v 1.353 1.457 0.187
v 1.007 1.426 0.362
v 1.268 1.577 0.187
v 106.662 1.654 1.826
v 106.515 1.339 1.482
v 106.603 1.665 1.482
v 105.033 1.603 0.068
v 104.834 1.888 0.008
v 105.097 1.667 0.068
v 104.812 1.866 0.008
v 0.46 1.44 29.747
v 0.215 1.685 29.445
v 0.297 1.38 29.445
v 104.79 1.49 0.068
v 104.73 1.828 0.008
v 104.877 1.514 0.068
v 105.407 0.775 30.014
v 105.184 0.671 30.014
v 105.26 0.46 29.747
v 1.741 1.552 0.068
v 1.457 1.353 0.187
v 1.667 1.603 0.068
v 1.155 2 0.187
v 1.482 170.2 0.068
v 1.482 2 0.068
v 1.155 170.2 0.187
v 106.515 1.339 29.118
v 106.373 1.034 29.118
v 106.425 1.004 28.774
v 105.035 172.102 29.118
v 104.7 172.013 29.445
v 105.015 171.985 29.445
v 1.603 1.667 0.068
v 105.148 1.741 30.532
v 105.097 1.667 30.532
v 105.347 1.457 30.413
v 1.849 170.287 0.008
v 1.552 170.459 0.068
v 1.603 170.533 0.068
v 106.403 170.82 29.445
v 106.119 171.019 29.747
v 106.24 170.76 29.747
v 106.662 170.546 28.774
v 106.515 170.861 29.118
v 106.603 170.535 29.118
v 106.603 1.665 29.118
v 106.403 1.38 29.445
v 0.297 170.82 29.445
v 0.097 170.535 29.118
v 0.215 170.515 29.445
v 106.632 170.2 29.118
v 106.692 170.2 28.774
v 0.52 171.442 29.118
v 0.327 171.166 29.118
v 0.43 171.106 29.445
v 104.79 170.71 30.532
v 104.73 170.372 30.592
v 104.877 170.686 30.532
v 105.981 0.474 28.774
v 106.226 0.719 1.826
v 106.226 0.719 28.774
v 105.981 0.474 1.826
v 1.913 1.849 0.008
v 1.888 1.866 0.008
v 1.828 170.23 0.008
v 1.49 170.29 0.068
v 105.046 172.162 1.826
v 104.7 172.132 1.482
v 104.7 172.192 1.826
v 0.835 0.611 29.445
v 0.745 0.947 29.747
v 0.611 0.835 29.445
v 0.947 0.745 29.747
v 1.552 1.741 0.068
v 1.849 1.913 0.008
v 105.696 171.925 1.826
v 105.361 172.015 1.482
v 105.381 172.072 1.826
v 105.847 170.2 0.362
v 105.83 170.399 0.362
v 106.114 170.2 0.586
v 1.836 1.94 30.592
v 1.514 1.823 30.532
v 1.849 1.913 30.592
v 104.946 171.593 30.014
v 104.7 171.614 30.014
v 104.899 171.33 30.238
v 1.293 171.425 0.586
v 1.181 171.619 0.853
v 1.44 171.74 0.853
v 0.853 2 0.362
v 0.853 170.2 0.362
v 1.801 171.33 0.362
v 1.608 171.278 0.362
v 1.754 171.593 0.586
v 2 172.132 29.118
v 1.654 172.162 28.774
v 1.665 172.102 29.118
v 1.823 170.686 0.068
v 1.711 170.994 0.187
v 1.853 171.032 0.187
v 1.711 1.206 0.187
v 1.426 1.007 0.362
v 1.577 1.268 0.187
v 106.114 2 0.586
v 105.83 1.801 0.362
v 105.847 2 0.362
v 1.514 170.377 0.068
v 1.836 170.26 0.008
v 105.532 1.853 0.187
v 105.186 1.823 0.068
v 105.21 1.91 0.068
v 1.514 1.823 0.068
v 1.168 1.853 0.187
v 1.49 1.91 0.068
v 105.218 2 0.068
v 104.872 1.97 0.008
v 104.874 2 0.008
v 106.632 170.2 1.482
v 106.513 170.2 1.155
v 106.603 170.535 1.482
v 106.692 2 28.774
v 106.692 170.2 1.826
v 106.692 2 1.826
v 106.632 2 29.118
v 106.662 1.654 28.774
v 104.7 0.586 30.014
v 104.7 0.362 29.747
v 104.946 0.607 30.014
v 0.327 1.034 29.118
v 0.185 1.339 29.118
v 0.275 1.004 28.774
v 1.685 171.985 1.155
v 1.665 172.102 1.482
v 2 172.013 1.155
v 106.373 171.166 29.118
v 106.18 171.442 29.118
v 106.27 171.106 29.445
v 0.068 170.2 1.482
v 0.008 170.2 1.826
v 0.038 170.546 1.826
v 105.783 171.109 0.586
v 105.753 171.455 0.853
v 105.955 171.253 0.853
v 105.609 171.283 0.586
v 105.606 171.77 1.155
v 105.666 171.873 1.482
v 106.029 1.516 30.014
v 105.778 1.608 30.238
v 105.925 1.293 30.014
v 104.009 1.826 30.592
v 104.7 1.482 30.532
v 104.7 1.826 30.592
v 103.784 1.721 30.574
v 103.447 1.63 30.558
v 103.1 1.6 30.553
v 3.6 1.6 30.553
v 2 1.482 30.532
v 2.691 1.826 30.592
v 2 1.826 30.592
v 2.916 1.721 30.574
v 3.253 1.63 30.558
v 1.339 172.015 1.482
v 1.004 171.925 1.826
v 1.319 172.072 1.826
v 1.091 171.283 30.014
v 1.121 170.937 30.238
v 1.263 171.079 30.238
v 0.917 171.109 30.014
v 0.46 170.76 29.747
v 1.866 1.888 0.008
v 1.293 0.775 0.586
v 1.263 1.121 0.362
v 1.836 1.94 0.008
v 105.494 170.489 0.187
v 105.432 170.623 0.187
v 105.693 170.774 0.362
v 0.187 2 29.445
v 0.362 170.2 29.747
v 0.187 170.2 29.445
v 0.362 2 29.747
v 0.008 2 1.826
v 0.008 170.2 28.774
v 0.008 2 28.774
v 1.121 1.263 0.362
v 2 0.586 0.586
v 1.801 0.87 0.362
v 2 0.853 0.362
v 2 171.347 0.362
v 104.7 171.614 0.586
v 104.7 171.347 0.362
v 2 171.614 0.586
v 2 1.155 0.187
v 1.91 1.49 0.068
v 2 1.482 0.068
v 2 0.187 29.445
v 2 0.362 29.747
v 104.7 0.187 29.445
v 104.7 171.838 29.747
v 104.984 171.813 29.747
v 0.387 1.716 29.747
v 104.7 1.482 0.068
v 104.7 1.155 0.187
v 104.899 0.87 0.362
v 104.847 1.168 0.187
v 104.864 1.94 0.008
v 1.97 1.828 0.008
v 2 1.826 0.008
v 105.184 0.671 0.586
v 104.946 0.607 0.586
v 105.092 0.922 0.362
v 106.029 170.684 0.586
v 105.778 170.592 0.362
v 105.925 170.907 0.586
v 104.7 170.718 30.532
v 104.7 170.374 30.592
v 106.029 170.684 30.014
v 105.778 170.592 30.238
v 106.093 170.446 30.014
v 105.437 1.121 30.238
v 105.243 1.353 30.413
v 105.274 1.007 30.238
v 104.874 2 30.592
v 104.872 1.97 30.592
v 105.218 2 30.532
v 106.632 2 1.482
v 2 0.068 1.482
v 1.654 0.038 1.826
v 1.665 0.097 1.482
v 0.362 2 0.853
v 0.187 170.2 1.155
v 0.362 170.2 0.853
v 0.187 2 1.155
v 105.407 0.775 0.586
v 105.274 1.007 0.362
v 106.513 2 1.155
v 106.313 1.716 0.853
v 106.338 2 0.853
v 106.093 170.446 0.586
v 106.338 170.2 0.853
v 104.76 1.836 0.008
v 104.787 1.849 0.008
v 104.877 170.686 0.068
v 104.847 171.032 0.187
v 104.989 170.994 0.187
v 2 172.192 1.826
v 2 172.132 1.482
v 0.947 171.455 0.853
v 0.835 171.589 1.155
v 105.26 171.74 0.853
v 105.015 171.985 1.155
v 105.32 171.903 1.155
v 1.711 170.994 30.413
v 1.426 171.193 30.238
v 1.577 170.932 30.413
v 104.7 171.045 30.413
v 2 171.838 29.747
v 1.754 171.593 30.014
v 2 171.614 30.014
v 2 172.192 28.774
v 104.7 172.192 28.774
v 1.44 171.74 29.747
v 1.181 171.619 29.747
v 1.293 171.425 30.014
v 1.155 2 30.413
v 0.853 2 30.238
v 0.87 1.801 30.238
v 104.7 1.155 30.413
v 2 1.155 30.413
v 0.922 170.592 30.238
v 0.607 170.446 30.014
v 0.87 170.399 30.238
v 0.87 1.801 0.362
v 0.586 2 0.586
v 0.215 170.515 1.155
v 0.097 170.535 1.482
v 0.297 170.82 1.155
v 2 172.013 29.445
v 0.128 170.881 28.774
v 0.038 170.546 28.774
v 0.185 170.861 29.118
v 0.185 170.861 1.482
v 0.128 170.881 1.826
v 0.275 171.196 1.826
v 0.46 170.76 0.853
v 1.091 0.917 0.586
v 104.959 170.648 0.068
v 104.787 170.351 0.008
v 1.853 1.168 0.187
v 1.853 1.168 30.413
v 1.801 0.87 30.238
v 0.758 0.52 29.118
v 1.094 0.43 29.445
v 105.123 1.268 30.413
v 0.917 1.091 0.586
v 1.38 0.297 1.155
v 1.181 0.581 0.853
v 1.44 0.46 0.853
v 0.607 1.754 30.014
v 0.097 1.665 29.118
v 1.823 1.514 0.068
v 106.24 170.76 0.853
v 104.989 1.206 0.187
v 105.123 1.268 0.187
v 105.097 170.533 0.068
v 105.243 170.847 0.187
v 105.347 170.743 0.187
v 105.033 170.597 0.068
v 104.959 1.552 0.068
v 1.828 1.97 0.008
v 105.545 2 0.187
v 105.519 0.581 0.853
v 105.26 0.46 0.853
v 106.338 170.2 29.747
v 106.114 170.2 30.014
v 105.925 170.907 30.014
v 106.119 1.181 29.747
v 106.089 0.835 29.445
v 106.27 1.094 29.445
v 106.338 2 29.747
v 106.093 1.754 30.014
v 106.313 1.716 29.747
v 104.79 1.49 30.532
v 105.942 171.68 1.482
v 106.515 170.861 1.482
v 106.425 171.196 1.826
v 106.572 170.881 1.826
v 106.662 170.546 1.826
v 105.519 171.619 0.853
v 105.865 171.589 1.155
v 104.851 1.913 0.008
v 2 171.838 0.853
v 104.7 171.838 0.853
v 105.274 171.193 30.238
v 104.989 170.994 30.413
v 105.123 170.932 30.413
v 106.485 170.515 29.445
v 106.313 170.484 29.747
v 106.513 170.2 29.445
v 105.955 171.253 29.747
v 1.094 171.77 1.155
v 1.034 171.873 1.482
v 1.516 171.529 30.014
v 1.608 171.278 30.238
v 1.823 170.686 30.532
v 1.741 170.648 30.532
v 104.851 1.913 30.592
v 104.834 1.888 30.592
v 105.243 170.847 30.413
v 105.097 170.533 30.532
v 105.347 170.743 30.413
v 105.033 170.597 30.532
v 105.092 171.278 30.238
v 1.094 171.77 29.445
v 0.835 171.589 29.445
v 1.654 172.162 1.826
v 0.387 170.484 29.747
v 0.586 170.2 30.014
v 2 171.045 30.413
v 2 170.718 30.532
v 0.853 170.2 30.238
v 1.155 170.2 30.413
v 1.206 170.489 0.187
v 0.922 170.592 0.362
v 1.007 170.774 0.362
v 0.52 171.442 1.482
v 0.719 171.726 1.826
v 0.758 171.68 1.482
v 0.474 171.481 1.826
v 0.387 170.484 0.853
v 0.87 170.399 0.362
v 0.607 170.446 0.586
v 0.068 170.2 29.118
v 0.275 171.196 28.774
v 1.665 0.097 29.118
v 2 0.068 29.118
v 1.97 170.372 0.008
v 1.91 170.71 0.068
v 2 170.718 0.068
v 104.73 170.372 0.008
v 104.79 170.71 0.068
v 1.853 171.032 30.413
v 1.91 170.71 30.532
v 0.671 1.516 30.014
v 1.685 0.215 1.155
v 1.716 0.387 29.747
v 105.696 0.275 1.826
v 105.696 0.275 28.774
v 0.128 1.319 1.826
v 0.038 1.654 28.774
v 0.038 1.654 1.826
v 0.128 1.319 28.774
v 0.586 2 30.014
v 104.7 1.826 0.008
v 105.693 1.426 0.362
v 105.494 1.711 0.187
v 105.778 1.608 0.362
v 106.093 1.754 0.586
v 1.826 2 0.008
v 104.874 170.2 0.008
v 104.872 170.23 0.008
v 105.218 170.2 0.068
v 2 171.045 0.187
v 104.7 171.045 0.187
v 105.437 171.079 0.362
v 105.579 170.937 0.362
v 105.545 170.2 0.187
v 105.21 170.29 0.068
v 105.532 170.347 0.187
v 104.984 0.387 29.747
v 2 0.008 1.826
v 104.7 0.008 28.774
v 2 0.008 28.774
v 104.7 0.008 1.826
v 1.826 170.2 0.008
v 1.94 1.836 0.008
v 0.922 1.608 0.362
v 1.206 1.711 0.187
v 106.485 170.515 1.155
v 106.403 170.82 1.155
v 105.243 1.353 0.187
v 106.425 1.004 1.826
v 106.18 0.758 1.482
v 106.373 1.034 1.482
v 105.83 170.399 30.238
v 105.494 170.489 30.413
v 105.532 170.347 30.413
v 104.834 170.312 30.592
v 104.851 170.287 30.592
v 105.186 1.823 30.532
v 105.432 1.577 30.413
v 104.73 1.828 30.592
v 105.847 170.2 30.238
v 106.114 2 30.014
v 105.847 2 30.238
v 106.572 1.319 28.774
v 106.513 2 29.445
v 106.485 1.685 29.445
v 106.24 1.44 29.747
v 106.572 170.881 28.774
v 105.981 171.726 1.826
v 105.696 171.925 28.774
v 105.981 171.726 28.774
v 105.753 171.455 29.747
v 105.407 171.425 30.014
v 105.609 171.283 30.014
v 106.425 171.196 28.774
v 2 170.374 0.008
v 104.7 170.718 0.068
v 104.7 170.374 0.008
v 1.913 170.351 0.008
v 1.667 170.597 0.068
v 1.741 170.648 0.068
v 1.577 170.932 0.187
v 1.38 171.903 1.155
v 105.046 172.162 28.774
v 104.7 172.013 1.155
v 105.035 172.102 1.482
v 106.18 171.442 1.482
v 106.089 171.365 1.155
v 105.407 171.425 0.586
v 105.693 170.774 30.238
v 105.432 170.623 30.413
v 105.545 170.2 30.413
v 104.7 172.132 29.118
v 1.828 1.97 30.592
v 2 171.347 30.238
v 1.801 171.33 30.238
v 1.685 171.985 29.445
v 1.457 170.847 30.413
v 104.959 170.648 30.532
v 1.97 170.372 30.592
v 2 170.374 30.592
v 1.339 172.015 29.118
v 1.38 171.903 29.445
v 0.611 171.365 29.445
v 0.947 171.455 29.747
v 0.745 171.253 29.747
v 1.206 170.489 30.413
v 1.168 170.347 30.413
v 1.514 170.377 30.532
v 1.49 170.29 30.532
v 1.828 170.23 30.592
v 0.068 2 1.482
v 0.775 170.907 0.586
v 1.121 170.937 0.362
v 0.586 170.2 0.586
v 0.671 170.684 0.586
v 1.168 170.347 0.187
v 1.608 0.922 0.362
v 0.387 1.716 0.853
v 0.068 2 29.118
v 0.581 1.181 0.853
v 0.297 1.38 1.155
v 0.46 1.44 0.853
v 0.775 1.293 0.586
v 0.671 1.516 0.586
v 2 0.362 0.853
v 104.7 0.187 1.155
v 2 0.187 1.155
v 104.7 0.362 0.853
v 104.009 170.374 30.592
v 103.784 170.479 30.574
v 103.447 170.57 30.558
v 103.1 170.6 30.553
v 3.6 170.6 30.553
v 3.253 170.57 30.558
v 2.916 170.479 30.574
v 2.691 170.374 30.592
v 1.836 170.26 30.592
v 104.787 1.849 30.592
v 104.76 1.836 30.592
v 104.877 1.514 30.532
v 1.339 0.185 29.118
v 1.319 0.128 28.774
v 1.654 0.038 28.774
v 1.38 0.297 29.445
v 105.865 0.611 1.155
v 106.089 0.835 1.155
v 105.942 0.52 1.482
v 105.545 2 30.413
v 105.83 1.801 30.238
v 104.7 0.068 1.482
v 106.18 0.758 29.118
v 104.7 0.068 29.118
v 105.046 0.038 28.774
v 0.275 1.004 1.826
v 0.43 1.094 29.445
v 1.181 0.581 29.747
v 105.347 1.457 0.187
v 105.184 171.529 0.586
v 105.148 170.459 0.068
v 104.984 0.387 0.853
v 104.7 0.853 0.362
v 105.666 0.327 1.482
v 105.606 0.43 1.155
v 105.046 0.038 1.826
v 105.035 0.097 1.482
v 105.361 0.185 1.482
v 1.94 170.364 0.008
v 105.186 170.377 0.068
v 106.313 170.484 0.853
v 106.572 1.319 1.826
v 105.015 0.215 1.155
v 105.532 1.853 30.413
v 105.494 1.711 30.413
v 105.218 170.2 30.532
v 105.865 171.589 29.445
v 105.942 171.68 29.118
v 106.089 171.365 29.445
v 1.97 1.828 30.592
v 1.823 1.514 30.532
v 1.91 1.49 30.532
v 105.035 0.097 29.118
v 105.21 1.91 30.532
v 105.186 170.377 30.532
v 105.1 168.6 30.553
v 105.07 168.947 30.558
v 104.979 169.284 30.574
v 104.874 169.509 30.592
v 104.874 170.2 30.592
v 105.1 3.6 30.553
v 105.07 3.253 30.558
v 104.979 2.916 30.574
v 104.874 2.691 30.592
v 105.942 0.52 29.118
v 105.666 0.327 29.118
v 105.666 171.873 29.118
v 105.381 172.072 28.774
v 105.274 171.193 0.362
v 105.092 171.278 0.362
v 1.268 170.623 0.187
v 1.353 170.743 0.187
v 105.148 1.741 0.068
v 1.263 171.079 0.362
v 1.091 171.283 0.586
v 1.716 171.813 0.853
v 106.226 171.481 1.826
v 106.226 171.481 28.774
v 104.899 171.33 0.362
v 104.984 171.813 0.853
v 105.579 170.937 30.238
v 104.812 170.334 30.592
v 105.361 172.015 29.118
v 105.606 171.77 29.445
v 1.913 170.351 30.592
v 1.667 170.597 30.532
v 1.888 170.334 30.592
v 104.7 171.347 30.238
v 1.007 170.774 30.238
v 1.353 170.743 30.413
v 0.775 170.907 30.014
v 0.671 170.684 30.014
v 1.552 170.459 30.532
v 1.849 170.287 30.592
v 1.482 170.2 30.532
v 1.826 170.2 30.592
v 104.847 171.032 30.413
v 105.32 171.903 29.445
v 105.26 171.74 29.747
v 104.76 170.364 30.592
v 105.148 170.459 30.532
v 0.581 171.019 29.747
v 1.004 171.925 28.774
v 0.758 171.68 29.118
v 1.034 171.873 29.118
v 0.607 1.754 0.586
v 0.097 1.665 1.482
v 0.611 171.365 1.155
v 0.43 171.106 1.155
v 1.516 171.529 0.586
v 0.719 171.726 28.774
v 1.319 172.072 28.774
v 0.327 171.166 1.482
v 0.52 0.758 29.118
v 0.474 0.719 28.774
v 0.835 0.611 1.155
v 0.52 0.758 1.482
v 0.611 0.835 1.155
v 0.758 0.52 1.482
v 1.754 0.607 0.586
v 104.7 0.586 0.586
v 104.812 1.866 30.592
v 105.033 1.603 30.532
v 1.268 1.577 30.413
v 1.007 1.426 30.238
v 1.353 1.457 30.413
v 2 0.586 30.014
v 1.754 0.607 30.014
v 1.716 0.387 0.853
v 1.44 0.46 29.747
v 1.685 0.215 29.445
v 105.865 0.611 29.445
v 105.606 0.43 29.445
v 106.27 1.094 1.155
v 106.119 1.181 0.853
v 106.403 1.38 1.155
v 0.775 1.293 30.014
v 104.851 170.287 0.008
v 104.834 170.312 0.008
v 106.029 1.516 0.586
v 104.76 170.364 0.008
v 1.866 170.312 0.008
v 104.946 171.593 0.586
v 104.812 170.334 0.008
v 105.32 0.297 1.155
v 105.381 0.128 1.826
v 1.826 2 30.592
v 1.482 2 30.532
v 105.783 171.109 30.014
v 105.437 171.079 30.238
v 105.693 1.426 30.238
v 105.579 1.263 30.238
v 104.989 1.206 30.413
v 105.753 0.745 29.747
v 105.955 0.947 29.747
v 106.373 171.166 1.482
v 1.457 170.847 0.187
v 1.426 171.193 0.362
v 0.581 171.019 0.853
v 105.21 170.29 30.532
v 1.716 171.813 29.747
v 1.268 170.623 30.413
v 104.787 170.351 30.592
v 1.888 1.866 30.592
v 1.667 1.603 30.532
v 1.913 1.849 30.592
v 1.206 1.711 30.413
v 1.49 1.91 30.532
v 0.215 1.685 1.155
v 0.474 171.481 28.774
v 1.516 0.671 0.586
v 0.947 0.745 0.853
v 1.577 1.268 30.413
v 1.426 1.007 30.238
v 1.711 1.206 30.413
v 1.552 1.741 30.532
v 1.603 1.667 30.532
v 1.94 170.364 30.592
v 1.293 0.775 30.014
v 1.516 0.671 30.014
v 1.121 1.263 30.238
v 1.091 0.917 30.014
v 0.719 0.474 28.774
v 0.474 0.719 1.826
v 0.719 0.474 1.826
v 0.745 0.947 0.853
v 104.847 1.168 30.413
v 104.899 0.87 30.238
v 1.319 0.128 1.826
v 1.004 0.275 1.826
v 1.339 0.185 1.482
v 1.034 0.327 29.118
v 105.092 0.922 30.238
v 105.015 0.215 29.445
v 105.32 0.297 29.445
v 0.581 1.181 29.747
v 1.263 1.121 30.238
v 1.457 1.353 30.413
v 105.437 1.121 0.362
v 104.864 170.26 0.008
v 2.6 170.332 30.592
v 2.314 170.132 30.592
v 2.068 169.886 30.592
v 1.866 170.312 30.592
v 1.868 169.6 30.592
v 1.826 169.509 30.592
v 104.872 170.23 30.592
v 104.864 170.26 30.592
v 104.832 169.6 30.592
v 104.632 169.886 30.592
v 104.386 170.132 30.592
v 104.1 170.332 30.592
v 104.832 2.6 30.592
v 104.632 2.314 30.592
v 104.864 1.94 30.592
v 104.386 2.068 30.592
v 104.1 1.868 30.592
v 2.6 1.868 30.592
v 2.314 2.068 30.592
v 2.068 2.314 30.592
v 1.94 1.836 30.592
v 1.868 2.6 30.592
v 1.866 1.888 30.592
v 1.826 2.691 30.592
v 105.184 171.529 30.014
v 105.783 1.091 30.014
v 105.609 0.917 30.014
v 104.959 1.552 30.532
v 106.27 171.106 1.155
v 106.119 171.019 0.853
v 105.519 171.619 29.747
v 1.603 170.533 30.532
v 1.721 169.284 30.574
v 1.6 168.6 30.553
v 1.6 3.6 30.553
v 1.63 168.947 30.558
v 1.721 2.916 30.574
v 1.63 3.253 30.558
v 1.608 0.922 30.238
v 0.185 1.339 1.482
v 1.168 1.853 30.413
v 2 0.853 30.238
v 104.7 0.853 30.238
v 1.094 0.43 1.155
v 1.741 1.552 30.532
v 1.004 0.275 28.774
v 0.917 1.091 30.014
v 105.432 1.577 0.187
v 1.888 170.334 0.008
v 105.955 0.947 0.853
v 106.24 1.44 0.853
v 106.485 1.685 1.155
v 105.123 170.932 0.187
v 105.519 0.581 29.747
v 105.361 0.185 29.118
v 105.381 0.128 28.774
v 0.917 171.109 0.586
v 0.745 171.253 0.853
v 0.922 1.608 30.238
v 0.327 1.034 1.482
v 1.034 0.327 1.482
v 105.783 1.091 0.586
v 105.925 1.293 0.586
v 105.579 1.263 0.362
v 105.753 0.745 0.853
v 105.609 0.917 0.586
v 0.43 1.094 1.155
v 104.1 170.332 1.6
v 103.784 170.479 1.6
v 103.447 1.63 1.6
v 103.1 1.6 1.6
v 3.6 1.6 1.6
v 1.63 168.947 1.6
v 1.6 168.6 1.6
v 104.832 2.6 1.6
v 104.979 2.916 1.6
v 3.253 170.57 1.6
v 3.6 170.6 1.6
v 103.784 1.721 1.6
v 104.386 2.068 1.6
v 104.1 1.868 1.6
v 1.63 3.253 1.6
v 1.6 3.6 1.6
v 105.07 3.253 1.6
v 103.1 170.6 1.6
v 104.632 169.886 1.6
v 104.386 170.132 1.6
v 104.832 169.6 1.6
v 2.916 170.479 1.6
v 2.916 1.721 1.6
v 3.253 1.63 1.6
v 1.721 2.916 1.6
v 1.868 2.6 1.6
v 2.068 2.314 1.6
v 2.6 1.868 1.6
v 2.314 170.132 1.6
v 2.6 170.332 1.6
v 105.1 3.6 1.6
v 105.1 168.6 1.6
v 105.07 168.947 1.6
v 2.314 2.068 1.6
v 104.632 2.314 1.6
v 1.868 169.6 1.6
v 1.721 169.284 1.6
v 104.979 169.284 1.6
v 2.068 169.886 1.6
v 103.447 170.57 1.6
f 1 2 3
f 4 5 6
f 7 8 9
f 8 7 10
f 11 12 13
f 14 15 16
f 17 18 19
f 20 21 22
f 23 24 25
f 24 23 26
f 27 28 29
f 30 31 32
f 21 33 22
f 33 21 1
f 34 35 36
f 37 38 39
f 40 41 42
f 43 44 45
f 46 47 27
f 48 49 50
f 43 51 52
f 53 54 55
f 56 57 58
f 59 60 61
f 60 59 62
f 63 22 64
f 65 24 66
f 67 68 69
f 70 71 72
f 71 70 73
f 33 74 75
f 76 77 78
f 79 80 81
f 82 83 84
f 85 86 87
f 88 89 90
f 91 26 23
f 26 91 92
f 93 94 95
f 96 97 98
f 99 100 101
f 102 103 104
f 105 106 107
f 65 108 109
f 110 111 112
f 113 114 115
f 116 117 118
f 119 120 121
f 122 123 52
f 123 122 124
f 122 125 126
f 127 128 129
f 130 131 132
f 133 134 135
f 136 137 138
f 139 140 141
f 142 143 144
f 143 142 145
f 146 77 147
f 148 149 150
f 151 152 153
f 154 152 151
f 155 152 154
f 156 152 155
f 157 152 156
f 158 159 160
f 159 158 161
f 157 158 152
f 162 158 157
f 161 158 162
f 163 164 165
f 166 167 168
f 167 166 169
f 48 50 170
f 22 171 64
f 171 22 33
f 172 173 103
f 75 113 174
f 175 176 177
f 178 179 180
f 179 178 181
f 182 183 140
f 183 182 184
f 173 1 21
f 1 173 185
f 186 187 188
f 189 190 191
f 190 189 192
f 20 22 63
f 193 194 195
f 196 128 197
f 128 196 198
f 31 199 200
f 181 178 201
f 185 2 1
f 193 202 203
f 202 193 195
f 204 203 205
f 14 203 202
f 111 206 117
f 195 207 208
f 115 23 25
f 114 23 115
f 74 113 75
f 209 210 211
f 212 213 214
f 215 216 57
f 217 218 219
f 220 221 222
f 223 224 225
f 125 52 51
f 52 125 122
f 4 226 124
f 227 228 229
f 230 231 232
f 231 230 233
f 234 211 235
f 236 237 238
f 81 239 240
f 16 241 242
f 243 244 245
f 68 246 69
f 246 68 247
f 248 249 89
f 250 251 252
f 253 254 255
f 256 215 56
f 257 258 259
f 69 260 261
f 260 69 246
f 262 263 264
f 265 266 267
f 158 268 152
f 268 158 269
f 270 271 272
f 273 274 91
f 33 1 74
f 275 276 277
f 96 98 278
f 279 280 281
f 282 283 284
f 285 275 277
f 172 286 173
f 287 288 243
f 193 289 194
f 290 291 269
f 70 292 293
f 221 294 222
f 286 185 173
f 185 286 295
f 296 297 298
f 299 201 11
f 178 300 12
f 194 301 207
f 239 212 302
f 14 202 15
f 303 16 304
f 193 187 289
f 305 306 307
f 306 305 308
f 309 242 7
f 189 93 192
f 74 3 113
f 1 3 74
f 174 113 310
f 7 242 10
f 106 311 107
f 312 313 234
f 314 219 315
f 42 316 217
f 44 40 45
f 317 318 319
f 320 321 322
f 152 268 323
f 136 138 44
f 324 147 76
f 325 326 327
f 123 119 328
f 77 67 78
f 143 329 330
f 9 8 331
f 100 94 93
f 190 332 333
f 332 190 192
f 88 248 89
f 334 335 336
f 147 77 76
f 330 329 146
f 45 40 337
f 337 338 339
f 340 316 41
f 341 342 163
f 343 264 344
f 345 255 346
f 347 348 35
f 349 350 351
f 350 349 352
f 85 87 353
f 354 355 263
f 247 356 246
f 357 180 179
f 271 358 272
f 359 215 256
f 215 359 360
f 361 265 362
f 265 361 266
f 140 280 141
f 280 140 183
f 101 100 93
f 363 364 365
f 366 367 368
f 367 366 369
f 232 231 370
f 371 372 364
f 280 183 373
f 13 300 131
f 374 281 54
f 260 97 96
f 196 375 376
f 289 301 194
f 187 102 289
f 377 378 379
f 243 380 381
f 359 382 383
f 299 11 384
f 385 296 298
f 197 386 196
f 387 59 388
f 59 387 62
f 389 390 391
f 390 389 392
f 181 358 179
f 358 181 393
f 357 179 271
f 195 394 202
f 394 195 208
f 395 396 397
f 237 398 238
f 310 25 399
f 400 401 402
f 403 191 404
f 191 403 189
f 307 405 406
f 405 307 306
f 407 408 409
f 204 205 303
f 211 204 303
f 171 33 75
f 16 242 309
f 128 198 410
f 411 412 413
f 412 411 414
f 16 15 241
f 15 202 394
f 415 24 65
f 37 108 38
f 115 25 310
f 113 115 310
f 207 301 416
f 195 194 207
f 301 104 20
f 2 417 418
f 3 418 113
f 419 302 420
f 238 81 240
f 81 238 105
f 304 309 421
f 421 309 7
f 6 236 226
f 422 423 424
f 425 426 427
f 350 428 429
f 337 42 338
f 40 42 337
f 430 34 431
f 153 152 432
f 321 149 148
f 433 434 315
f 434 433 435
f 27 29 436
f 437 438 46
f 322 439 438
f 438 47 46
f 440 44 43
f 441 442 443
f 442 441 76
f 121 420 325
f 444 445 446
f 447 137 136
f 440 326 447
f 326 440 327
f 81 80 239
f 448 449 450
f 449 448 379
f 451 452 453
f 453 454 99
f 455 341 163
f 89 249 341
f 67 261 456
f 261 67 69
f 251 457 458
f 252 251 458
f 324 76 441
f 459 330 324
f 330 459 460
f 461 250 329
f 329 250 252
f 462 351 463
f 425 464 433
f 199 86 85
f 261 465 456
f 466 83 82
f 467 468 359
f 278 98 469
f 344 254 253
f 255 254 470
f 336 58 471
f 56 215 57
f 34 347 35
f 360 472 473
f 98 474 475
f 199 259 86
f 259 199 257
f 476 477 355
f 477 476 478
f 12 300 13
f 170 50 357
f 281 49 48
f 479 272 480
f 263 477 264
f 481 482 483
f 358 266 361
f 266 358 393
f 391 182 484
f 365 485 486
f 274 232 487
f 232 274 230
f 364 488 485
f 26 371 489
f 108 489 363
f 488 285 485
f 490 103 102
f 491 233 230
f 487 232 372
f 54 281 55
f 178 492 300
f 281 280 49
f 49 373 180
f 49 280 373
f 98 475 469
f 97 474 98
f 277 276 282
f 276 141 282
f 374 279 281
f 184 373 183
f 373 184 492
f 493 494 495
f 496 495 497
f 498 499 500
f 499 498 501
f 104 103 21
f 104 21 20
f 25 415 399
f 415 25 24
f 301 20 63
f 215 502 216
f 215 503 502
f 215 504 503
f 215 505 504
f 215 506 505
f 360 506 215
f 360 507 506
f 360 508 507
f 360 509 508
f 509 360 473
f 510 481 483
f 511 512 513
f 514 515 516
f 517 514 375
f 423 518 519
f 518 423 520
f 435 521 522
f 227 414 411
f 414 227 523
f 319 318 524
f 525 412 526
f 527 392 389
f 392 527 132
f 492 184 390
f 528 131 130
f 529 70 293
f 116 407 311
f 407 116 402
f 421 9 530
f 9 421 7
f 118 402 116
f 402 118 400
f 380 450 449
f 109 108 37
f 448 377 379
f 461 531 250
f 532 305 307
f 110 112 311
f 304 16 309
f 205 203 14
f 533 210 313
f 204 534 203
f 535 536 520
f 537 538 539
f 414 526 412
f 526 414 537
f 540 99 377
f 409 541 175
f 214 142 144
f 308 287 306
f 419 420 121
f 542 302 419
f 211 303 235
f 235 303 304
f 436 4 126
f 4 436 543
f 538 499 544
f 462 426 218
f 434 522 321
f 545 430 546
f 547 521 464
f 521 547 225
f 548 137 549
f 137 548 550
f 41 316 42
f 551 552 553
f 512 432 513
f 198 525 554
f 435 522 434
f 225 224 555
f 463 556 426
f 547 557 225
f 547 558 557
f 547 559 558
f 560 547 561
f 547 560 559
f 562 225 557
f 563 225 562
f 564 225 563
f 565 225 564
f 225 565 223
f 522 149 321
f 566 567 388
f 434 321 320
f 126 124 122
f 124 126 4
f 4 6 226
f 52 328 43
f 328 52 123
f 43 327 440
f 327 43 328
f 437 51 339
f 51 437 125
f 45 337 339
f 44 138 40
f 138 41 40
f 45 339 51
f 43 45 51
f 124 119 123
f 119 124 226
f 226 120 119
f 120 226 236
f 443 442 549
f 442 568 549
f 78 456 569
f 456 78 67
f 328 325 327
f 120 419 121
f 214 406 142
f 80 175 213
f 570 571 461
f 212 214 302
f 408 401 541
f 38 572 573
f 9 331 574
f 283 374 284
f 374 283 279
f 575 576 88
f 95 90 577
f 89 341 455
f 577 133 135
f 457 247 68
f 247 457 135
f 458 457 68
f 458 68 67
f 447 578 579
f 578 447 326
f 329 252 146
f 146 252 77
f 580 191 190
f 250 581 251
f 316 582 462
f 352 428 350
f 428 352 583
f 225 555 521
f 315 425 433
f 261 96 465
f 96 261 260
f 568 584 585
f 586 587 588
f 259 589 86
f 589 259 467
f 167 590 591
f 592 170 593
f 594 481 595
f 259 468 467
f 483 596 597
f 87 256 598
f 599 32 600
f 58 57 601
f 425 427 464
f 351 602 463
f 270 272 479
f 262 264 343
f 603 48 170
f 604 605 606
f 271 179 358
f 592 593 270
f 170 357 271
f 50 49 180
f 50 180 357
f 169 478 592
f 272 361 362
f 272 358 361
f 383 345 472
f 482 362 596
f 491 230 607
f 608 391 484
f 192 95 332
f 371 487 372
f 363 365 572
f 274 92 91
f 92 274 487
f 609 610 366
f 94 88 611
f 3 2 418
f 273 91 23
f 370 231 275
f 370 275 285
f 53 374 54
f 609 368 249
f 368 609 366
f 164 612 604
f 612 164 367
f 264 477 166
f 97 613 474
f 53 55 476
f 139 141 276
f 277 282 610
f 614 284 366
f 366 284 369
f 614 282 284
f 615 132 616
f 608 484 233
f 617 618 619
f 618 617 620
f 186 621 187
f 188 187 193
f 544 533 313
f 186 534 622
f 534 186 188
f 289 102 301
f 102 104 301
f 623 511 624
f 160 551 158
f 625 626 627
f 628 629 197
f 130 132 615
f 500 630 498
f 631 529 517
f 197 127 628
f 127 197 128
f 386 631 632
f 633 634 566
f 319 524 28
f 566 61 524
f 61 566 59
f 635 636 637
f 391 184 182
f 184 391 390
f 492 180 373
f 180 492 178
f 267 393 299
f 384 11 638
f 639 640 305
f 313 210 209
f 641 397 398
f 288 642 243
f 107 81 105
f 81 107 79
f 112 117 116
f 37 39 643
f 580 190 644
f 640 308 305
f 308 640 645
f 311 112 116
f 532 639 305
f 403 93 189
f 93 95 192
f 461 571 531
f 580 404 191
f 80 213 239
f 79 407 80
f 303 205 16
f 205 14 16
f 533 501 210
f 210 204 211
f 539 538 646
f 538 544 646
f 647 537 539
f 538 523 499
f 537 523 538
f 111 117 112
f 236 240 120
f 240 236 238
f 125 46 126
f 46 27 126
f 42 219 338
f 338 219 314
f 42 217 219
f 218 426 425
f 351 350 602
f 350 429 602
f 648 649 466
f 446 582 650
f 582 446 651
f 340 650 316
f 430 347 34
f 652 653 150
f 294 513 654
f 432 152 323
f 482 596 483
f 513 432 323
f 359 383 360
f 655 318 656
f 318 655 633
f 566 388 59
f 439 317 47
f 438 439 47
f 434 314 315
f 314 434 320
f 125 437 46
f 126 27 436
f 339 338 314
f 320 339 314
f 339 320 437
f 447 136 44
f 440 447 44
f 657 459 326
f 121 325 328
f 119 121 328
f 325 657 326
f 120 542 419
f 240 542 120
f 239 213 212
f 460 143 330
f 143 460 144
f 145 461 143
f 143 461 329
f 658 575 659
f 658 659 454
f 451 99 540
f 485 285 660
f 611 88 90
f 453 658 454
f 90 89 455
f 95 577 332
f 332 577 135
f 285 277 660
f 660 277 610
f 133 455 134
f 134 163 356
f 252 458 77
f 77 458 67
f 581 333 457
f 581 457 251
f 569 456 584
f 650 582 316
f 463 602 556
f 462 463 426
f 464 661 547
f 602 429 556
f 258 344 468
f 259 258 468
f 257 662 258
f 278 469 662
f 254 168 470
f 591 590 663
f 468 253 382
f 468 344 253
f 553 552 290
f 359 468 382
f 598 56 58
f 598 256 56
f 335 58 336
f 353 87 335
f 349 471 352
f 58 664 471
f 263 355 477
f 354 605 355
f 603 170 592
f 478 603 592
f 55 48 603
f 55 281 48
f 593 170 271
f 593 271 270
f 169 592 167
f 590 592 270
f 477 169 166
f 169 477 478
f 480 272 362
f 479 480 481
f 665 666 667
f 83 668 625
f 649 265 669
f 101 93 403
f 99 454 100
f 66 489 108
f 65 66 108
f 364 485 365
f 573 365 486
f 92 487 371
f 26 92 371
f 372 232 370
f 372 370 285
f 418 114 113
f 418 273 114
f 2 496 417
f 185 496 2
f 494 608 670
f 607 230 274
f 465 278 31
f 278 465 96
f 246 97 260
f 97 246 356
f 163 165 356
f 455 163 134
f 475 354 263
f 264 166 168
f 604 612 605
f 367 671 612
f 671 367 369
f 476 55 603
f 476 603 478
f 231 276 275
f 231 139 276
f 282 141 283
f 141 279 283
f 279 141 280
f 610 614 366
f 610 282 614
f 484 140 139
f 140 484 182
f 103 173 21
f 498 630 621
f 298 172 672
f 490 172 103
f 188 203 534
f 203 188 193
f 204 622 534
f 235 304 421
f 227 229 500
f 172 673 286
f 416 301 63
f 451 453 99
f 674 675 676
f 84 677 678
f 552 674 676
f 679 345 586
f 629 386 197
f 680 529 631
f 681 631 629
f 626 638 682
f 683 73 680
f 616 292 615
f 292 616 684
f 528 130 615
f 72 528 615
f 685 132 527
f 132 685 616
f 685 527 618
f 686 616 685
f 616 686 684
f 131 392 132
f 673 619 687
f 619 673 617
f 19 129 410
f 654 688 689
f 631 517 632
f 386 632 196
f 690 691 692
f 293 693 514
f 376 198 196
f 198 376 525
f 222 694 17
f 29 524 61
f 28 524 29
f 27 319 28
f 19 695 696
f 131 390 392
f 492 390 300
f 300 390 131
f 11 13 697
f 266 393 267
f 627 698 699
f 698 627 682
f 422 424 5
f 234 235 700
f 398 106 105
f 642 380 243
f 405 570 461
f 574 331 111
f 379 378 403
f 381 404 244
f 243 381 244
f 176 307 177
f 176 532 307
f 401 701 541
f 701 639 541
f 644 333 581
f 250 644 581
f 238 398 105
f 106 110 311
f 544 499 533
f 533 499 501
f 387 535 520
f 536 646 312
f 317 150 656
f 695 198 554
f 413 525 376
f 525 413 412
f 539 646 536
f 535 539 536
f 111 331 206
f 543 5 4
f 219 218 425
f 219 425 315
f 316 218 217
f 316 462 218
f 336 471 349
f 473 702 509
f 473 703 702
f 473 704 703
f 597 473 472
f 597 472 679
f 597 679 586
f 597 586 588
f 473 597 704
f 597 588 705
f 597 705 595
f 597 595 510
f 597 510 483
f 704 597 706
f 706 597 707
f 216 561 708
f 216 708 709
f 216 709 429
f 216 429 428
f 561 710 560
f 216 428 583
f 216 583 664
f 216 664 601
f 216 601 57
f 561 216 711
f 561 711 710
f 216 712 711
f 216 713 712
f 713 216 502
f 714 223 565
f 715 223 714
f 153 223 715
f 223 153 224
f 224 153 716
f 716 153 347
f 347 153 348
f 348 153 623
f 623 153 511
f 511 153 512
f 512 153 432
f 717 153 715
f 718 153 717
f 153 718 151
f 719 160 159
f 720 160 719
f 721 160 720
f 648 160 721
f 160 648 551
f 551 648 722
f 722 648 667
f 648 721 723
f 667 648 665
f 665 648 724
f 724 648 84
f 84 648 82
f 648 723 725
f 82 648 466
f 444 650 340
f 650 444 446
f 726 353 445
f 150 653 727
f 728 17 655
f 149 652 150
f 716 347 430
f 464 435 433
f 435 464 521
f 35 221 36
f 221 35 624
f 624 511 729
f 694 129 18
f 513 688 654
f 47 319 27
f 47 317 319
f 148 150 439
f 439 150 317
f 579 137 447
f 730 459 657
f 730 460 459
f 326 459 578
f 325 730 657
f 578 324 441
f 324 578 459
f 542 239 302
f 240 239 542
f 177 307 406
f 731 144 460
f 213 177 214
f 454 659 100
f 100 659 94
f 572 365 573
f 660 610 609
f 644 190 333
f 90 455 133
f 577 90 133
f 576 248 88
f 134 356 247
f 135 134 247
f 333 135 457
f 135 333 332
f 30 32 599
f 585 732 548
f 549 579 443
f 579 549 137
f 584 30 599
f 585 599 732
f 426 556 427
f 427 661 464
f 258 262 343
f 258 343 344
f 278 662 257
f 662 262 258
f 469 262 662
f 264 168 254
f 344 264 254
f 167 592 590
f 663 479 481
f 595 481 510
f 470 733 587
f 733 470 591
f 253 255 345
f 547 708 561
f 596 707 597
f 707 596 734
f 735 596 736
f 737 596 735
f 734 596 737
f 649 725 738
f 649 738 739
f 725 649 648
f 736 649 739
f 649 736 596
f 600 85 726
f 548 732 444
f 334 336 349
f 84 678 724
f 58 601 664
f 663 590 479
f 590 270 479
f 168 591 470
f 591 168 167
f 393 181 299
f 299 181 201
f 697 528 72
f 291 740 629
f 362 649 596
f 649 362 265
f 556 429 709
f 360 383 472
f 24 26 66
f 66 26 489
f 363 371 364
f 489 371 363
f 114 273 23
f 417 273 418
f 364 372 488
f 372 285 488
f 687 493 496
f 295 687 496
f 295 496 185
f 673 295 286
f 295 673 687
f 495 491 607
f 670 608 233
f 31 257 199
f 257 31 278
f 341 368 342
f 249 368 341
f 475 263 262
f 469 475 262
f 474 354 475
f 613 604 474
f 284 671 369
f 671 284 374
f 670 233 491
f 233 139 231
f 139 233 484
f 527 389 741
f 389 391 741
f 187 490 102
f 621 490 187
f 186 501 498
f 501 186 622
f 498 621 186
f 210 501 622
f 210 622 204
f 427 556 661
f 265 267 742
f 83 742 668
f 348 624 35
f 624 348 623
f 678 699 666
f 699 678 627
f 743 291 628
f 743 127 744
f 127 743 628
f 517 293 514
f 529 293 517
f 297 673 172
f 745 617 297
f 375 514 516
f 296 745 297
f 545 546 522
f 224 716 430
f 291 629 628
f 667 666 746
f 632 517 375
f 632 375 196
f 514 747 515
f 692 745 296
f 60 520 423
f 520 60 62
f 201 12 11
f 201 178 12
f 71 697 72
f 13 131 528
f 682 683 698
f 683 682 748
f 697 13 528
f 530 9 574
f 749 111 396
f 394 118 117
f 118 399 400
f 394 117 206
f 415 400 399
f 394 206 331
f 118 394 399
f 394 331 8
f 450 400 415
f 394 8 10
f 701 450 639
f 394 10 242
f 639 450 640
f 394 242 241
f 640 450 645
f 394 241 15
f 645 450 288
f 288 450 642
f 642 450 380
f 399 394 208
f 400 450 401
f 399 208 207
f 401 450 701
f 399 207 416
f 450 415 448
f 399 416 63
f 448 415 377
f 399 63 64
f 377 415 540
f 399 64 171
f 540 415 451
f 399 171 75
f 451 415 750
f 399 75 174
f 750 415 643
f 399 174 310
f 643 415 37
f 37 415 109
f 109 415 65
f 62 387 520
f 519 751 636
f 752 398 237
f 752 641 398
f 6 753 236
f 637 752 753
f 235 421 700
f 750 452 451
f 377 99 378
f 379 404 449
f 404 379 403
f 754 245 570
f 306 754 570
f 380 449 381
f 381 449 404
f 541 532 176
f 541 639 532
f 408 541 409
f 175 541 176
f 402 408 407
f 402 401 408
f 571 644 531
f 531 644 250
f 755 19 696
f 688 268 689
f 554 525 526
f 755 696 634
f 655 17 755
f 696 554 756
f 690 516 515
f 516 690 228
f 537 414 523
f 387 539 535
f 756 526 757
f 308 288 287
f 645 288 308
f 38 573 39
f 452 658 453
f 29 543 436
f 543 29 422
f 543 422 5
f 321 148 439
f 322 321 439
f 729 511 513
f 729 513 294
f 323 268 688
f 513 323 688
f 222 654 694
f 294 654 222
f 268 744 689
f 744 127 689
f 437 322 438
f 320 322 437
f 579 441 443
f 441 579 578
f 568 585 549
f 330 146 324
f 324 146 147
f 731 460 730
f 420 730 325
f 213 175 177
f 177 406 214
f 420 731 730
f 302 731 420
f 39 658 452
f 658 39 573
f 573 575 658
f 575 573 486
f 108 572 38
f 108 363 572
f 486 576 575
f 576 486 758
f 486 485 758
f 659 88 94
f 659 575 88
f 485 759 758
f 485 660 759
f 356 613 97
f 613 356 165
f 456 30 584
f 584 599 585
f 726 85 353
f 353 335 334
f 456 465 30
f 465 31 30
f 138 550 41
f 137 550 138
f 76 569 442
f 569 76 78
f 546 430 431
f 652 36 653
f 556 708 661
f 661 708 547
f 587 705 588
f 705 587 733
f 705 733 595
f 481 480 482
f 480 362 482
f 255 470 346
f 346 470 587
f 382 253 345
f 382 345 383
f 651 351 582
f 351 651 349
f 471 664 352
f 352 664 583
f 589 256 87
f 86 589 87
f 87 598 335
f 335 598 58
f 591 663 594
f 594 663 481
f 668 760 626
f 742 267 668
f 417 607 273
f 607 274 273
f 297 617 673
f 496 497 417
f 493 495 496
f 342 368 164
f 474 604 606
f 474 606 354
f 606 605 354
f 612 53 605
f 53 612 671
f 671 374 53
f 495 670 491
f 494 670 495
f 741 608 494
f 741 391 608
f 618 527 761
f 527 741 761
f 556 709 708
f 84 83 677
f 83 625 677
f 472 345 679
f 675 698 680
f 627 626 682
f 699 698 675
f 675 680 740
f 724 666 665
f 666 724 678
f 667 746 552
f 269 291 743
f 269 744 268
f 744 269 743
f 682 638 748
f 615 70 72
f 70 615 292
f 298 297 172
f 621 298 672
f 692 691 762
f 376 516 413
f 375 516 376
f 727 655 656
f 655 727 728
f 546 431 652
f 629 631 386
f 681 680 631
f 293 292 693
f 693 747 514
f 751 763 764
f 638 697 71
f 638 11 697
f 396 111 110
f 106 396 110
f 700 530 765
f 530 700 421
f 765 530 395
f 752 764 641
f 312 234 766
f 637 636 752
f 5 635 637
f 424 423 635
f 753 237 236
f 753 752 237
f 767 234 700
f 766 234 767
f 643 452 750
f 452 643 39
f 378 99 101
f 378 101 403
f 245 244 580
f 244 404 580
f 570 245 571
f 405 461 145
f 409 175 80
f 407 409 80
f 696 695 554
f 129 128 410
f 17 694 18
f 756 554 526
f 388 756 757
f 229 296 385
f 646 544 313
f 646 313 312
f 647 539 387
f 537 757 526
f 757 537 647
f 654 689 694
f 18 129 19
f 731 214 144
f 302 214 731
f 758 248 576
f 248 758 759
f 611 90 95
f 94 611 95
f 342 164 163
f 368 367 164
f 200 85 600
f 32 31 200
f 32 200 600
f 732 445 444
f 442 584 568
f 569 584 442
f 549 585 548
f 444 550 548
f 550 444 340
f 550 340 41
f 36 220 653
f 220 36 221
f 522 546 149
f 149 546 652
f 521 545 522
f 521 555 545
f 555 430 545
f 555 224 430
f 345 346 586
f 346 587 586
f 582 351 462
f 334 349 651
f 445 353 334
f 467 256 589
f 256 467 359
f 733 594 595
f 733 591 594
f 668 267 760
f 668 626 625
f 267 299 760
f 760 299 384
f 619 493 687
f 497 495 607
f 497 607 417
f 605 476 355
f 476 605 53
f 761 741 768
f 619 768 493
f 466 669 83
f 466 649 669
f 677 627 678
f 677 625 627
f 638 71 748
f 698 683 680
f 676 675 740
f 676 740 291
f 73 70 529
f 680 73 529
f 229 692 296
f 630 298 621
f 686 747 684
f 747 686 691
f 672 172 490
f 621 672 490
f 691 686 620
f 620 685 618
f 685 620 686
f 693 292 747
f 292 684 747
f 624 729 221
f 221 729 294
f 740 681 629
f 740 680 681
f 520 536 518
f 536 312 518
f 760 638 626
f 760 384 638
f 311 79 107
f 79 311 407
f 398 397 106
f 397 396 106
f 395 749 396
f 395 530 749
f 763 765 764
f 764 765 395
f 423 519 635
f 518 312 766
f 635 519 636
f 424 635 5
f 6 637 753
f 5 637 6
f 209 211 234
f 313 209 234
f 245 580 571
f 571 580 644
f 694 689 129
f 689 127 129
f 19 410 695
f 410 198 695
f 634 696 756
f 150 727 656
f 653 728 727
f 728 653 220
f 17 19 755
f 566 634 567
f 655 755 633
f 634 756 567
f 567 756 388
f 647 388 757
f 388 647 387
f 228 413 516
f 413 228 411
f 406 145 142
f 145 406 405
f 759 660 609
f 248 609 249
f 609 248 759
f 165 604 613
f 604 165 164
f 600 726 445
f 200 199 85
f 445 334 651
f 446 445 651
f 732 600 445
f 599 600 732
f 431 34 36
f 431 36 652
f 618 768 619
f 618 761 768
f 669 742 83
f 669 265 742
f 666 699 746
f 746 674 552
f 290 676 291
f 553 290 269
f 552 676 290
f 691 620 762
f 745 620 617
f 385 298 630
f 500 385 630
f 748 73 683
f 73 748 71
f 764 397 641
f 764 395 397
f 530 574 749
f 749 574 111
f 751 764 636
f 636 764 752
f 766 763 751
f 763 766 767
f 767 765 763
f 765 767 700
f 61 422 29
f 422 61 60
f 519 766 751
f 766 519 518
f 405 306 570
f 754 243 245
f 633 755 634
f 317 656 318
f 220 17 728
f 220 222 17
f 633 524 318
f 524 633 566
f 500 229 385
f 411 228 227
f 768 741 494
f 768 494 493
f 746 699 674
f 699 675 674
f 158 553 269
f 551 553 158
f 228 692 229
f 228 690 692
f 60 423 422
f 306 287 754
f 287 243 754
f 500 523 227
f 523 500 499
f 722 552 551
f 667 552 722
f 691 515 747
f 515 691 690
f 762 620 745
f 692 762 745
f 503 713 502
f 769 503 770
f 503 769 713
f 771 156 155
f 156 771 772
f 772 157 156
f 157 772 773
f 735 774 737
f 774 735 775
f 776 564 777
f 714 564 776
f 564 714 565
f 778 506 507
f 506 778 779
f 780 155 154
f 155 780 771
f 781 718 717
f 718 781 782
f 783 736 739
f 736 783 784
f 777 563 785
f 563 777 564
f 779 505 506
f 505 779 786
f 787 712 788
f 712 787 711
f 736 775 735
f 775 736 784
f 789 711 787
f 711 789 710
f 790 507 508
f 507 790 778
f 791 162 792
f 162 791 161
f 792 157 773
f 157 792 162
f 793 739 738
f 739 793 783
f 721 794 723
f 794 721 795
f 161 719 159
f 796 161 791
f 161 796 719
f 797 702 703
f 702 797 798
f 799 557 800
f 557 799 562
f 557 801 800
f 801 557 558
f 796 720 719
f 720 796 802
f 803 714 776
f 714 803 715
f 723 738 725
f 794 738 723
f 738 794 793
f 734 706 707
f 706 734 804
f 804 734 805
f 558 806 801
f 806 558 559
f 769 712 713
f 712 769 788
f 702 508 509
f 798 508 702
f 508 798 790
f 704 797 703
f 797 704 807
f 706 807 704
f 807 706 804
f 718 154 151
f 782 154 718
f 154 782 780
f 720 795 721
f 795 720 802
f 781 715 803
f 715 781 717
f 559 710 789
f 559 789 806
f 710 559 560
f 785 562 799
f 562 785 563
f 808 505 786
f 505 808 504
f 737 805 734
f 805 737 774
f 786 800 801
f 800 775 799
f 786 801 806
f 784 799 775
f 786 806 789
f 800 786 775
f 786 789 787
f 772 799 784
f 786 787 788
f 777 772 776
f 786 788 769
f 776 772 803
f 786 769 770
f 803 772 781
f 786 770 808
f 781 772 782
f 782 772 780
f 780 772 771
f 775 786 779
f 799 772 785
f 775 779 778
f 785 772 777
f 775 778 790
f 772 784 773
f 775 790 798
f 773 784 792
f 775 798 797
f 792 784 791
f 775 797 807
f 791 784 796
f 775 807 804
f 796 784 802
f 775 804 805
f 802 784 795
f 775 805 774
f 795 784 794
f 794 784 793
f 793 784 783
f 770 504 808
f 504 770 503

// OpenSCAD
// =============================================
// 3D: Audio Tools Case — base
// Version: 2.0
// Author: Cascade generator
// =============================================

// Short description for models table
description = "";
version_str = "2.0";

// ----------------------------
// Параметры модели (все размеры в мм)
// ----------------------------
// Коробка делится на N отделов: section 1, section 2, ... section N
// x, y, z - подразумевают внутренние размеры. Внешние размеры вычисляются автоматически.

is_small = false;
// Ширины отсеков (по X). Любое количество
sections_x = is_small ? [102.5] : [102.5 + 1];
// глубина по Y
inner_y    = is_small ? 20 : 168 + 1;
// внутренняя глубина во всех отсеках
inner_h    = is_small ? 10 : 28 + 1;
    
// Скругление наружного прямоугольника
radius_r     = 1;          // радиус скругления углов
sec_corner_r = 2;          // радиус скругления углов вырезов секций
minkowski_r  = 2;          // радиус скругления краёв крышки через minkowski

// Толщины
wall_th      = 1.6;          // толщина наружных стенок
divider_th   = 1.6;          // толщина перегородок
bottom_th    = 1.6;          // толщина дна

// Параметры крышки (cap)
cap_top_th        = 1.6;     // толщина верхней пластины крышки
cap_lip_h         = 10;     // высота юбки (захват за стенки)
cap_fit_clearance = 0.1;   // зазор между наружными стенками коробки и внутренней поверхностью юбки
cap_th            = 1.6; // толщина стенки крышки; по умолчанию согласована с margin и зазором

// Насадка крышки: опустить вершины межсекционных перегородок на заданную высоту
// Делает перегородки ниже на Z, чтобы крышка/вкладыш входили без упора в перегородки
sections_to_cap_gap = 5; // мм

// Поправки размеров (фактические измерения)
sec_x_delta   = 0;     // каждая секция по X шире, чем надо
y_delta       = 0;     // каждая секция по Y шире, чем надо

// Флаги печати
print_box = true;     // печатать основание (лоток)
print_cap = false;     // печатать крышку





use <../modules.scad>;

// ----------------------------
// Настройка точности
// ----------------------------
$fn = 0;        // фиксированную сегментацию отключаем
$fa = 6;        // 5–8° обычно достаточно
$fs = 0.35;     // ≈ диаметр сопла (0.3–0.5 для сопла 0.4)
pin_fs = 0.25;  // чуть тоньше для штырей и отверстий

// Эффективные размеры с учётом поправок
sections_x_e = [ for (w = sections_x) w + sec_x_delta ];

// Вспомогательные функции суммирования
function sum_first(v, n, i=0, acc=0) = (i >= n) ? acc : sum_first(v, n, i+1, acc + v[i]);
function vec_sum(v) = sum_first(v, len(v));

cap_h = cap_top_th + cap_lip_h;   // итоговая высота крышки

// Предвычисленные вспомогательные величины (для читаемости, без изменения формул)
n_sections = len(sections_x_e);
sum_sections_x = vec_sum(sections_x_e);
outer_margin_eff = cap_fit_clearance + cap_th; // посадка крышки
cap_h_target = cap_top_th + cap_lip_h;

// ----------------------------
// Геометрия корпуса
// ----------------------------
// Общая ширина X: стены + сумма секций + перегородки между ними
inner_y_e = inner_y + y_delta;
outer_x = 2*wall_th + sum_sections_x + divider_th * max(n_sections - 1, 0);
outer_y = 2*wall_th + inner_y_e;
outer_h = bottom_th + inner_h;

// Отсеки формируются перегородками; явные вырезы не используются

// Базовый заполняющий объём (без вырезов) — внешний контур на полную высоту
module base_fill(){
    // Только внешний контур на полную высоту; срез верха делаем позже, локально по перегородкам
    rounded_prism(size=[outer_x, outer_y], h=outer_h, r=radius_r);
}

section_x_offset = wall_th;
section_y = wall_th;
// Вырезы-отсеки формируются по массиву sections_x_e
// Позиция i-го отсека: сдвиг от левой стены = сумма предыдущих ширин + перегородки между ними
function section_x_at(i) = section_x_offset + sum_first(sections_x_e, i) + divider_th * i;
module section_at(i){
    translate([section_x_at(i), section_y, bottom_th])
        rounded_prism(size=[sections_x_e[i], inner_y_e], h=inner_h, r=sec_corner_r);
}

module base(){
    // Корпус-лоток как разность наружного корпуса (с опциональным Minkowski) минус секции,
    // а затем локальный срез верхушек перегородок
    difference(){
        // Наружный корпус
        rounded_prism([outer_x, outer_y], outer_h, radius_r, minkowski_r);

        // Вырезы секций по массиву ширин (section 1..N)
        for (i = [0 : n_sections - 1])
            section_at(i);

        // Срезать верх перегородок на заданную высоту, не затрагивая наружные стены
        dividers_top_cut();
    }
}

// Сервис: левый X-край перегородки между секцией i и i+1
function divider_x_at(i) = section_x_at(i) + sections_x_e[i];

// Локальный верхний срез только по перегородкам (полосы шириной divider_th)
module dividers_top_cut(){
    // Безопасный зажим высоты среза: 0..(inner_h-eps)
    g = min(max(sections_to_cap_gap, 0), inner_h);
    if (g > 0 && n_sections > 1){
        for (i = [0 : n_sections - 2])
            translate([
                divider_x_at(i) - sec_corner_r*2,
                wall_th,
                // немного уводим вниз на eps, чтобы исключить выход выше верха
                bottom_th + inner_h - g
            ])
                cube([sec_corner_r*4+divider_th, inner_y_e, g]);
    }
}

// ---------------
// Крышка (cap)
// ---------------
// Крышка состоит из:
// - верхней пластины толщиной cap_top_th, размерами больше корпуса с каждой стороны
// - внутренней юбки высотой cap_lip_h, которая надевается на корпус с зазором cap_fit_clearance
module cap(){
    difference(){
        // Наружный контур с опциональным скруглением краёв
        rounded_prism(
            [outer_x + 2*outer_margin_eff, outer_y + 2*outer_margin_eff],
            h=cap_h_target,
            r=radius_r,
            kr=minkowski_r
        );

        // Внутренняя поверхность юбки (посадка по зазору)
        translate([cap_th, cap_th, 0])
            rounded_prism(
                size=[outer_x + 2*cap_fit_clearance, outer_y + 2*cap_fit_clearance],
                h=cap_lip_h + 2*eps(),
                r=radius_r + cap_fit_clearance
            );
    }
}

// Вывод всех фрагментов
// ----------------------------
module all_parts(){
    // Раскладка деталей по Y при одновременной печати
    x_gap = 10;  // использовать существующий зазор
    y_shift = (print_box && print_cap) ? (outer_y + x_gap) : 0;

    if (print_box) translate([0, 0, 0]) base();
    if (print_cap) translate([0, y_shift, 0]) upside_down(cap_h) cap();
}

// ----------------------------
// ВЫВОД МОДЕЛИ
// ----------------------------
clip_for_fragments(){ all_parts(); }
 
